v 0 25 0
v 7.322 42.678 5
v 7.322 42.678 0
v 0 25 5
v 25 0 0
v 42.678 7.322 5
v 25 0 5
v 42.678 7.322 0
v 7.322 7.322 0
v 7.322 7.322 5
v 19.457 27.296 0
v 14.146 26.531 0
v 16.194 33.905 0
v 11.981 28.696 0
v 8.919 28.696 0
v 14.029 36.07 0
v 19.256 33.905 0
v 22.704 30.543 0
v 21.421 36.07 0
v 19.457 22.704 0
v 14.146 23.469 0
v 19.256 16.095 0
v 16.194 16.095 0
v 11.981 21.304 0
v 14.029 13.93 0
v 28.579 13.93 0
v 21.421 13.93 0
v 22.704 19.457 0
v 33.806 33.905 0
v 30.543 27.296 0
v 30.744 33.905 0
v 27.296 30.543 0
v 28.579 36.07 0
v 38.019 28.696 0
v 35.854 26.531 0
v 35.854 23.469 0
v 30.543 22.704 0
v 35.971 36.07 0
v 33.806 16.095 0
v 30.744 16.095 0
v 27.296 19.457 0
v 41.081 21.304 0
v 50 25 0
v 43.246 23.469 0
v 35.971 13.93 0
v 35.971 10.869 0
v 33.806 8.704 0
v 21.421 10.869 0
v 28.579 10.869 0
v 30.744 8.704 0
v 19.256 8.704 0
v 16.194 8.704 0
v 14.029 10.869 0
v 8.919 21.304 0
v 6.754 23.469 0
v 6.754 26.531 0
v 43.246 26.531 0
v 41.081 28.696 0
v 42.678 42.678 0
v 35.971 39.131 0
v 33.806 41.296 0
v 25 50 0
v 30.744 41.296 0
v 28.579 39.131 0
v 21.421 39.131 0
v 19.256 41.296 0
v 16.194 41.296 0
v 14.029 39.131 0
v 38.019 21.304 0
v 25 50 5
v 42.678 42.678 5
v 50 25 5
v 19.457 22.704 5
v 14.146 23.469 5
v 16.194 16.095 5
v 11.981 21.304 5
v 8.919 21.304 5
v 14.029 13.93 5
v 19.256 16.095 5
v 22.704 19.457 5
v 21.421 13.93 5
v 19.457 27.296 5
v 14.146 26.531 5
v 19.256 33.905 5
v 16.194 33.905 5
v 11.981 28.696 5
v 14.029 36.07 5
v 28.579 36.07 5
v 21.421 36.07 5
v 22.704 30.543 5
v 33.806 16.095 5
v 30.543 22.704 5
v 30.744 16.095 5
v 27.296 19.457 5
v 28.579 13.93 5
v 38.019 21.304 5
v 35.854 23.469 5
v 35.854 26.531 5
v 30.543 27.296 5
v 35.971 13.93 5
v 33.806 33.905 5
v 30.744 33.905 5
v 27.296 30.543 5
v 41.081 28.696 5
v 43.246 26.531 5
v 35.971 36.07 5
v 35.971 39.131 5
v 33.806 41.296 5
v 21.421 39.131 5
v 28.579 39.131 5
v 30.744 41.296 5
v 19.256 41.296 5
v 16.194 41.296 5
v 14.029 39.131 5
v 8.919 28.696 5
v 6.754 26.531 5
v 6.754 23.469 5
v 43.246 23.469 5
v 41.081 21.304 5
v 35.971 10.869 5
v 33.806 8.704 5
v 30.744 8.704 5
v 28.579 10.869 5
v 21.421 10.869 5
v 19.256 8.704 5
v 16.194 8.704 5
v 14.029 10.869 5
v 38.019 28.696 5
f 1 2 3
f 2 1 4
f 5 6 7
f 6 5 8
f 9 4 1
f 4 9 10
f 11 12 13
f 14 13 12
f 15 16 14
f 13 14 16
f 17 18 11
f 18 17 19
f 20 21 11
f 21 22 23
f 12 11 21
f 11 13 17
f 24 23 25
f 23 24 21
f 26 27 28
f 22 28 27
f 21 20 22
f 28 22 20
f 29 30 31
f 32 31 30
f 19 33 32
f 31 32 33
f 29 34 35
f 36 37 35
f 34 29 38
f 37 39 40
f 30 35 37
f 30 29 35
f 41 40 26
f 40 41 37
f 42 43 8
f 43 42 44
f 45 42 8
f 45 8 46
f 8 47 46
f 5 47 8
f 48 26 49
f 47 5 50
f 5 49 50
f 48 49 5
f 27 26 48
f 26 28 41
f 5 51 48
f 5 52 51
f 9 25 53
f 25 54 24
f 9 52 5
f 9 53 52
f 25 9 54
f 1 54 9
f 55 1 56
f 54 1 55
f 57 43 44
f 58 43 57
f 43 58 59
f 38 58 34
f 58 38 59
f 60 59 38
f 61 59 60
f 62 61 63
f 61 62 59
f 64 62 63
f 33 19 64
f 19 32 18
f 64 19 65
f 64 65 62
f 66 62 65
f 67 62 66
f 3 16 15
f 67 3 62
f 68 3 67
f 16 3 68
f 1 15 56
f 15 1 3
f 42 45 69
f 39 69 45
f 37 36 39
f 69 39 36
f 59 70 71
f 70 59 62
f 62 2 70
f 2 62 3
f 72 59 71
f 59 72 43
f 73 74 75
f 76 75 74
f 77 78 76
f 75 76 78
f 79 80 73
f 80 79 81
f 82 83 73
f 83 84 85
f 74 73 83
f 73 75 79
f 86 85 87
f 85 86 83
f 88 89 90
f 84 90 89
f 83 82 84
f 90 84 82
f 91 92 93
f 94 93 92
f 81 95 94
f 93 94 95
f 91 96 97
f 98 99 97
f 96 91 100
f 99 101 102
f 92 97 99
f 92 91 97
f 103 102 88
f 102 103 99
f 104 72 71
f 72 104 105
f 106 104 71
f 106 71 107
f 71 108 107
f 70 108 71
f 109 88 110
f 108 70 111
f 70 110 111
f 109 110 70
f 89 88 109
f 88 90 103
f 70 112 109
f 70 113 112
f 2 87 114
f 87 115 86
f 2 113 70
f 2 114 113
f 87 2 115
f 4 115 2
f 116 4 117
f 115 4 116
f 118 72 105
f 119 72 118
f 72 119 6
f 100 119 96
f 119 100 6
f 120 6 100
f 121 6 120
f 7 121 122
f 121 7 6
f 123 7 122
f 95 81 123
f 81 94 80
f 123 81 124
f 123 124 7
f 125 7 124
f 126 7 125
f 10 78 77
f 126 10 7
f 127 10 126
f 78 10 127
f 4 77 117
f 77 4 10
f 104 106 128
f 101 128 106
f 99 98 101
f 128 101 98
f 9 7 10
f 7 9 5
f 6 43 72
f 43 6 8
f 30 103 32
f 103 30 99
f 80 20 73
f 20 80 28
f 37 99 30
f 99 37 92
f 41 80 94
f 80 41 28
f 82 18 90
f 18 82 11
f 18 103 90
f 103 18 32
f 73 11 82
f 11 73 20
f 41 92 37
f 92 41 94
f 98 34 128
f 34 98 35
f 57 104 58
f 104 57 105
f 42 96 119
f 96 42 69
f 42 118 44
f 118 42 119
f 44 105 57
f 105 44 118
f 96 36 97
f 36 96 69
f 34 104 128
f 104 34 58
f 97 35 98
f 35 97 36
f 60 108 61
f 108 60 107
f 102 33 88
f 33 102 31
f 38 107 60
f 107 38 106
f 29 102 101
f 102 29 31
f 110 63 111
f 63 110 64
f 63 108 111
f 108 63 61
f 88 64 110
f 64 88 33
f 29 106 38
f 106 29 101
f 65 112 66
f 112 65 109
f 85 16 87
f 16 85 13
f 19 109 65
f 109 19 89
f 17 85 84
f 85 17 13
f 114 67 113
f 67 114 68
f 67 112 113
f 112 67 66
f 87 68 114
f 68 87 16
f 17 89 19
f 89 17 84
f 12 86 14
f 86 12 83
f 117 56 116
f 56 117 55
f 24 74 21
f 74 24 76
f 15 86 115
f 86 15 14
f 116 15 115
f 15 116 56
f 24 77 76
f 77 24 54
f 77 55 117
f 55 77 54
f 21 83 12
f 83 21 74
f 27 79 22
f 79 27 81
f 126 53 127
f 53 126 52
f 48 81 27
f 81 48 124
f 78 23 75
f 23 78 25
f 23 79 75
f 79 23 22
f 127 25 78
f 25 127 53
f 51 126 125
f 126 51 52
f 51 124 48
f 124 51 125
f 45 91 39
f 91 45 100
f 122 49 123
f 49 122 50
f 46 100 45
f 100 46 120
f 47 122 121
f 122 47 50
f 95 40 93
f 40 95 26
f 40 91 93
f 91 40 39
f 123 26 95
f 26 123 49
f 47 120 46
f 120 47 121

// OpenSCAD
$fn = 32;

// ----------------------------------------------------------------------
// Polygon plate: 8-gon R25, 6 bolt windows
// ----------------------------------------------------------------------

// --- parameters (mm) ---
sides = 8;                // number of polygon sides
plate_r = 25;             // circumscribed radius of the polygon
bore_r = 6;               // centre bore radius
bolts = 6;                // number of bolt windows
ring_r = 14.55;           // bolt-circle radius
bolt_r = 4;               // bolt window radius
plate_t = 5;              // plate thickness, Z (extrusion height)

plate_d = 2 * plate_r;  // circumscribed diameter
bore_d = 2 * bore_r;  // centre bore diameter
bolt_d = 2 * bolt_r;  // bolt window diameter
ring_d = 2 * ring_r;  // bolt-circle diameter

profile = [[50, 25], [42.678, 42.678], [25, 50], [7.322, 42.678], [0, 25], [7.322, 7.322], [25, 0], [42.678, 7.322]];  // primary outline, 8 points, counter clockwise
void_1 = [[30.543, 27.296], [27.296, 30.543], [22.704, 30.543], [19.457, 27.296], [19.457, 22.704], [22.704, 19.457], [27.296, 19.457], [30.543, 22.704]];  // centre bore, 8 points
void_2 = [[43.246, 26.531], [41.081, 28.696], [38.019, 28.696], [35.854, 26.531], [35.854, 23.469], [38.019, 21.304], [41.081, 21.304], [43.246, 23.469]];  // bolt window 1, 8 points
void_3 = [[35.971, 39.131], [33.806, 41.296], [30.744, 41.296], [28.579, 39.131], [28.579, 36.07], [30.744, 33.905], [33.806, 33.905], [35.971, 36.07]];  // bolt window 2, 8 points
void_4 = [[21.421, 39.131], [19.256, 41.296], [16.194, 41.296], [14.029, 39.131], [14.029, 36.07], [16.194, 33.905], [19.256, 33.905], [21.421, 36.07]];  // bolt window 3, 8 points
void_5 = [[14.146, 26.531], [11.981, 28.696], [8.919, 28.696], [6.754, 26.531], [6.754, 23.469], [8.919, 21.304], [11.981, 21.304], [14.146, 23.469]];  // bolt window 4, 8 points
void_6 = [[21.421, 13.93], [19.256, 16.095], [16.194, 16.095], [14.029, 13.93], [14.029, 10.869], [16.194, 8.704], [19.256, 8.704], [21.421, 10.869]];  // bolt window 5, 8 points
void_7 = [[35.971, 13.93], [33.806, 16.095], [30.744, 16.095], [28.579, 13.93], [28.579, 10.869], [30.744, 8.704], [33.806, 8.704], [35.971, 10.869]];  // bolt window 6, 8 points

// --- the one profile operation ---
difference() {
  linear_extrude(height = plate_t) polygon(points = profile);
  translate([0, 0, -1])
    linear_extrude(height = plate_t + 2) polygon(points = void_1);
  translate([0, 0, -1])
    linear_extrude(height = plate_t + 2) polygon(points = void_2);
  translate([0, 0, -1])
    linear_extrude(height = plate_t + 2) polygon(points = void_3);
  translate([0, 0, -1])
    linear_extrude(height = plate_t + 2) polygon(points = void_4);
  translate([0, 0, -1])
    linear_extrude(height = plate_t + 2) polygon(points = void_5);
  translate([0, 0, -1])
    linear_extrude(height = plate_t + 2) polygon(points = void_6);
  translate([0, 0, -1])
    linear_extrude(height = plate_t + 2) polygon(points = void_7);
}
